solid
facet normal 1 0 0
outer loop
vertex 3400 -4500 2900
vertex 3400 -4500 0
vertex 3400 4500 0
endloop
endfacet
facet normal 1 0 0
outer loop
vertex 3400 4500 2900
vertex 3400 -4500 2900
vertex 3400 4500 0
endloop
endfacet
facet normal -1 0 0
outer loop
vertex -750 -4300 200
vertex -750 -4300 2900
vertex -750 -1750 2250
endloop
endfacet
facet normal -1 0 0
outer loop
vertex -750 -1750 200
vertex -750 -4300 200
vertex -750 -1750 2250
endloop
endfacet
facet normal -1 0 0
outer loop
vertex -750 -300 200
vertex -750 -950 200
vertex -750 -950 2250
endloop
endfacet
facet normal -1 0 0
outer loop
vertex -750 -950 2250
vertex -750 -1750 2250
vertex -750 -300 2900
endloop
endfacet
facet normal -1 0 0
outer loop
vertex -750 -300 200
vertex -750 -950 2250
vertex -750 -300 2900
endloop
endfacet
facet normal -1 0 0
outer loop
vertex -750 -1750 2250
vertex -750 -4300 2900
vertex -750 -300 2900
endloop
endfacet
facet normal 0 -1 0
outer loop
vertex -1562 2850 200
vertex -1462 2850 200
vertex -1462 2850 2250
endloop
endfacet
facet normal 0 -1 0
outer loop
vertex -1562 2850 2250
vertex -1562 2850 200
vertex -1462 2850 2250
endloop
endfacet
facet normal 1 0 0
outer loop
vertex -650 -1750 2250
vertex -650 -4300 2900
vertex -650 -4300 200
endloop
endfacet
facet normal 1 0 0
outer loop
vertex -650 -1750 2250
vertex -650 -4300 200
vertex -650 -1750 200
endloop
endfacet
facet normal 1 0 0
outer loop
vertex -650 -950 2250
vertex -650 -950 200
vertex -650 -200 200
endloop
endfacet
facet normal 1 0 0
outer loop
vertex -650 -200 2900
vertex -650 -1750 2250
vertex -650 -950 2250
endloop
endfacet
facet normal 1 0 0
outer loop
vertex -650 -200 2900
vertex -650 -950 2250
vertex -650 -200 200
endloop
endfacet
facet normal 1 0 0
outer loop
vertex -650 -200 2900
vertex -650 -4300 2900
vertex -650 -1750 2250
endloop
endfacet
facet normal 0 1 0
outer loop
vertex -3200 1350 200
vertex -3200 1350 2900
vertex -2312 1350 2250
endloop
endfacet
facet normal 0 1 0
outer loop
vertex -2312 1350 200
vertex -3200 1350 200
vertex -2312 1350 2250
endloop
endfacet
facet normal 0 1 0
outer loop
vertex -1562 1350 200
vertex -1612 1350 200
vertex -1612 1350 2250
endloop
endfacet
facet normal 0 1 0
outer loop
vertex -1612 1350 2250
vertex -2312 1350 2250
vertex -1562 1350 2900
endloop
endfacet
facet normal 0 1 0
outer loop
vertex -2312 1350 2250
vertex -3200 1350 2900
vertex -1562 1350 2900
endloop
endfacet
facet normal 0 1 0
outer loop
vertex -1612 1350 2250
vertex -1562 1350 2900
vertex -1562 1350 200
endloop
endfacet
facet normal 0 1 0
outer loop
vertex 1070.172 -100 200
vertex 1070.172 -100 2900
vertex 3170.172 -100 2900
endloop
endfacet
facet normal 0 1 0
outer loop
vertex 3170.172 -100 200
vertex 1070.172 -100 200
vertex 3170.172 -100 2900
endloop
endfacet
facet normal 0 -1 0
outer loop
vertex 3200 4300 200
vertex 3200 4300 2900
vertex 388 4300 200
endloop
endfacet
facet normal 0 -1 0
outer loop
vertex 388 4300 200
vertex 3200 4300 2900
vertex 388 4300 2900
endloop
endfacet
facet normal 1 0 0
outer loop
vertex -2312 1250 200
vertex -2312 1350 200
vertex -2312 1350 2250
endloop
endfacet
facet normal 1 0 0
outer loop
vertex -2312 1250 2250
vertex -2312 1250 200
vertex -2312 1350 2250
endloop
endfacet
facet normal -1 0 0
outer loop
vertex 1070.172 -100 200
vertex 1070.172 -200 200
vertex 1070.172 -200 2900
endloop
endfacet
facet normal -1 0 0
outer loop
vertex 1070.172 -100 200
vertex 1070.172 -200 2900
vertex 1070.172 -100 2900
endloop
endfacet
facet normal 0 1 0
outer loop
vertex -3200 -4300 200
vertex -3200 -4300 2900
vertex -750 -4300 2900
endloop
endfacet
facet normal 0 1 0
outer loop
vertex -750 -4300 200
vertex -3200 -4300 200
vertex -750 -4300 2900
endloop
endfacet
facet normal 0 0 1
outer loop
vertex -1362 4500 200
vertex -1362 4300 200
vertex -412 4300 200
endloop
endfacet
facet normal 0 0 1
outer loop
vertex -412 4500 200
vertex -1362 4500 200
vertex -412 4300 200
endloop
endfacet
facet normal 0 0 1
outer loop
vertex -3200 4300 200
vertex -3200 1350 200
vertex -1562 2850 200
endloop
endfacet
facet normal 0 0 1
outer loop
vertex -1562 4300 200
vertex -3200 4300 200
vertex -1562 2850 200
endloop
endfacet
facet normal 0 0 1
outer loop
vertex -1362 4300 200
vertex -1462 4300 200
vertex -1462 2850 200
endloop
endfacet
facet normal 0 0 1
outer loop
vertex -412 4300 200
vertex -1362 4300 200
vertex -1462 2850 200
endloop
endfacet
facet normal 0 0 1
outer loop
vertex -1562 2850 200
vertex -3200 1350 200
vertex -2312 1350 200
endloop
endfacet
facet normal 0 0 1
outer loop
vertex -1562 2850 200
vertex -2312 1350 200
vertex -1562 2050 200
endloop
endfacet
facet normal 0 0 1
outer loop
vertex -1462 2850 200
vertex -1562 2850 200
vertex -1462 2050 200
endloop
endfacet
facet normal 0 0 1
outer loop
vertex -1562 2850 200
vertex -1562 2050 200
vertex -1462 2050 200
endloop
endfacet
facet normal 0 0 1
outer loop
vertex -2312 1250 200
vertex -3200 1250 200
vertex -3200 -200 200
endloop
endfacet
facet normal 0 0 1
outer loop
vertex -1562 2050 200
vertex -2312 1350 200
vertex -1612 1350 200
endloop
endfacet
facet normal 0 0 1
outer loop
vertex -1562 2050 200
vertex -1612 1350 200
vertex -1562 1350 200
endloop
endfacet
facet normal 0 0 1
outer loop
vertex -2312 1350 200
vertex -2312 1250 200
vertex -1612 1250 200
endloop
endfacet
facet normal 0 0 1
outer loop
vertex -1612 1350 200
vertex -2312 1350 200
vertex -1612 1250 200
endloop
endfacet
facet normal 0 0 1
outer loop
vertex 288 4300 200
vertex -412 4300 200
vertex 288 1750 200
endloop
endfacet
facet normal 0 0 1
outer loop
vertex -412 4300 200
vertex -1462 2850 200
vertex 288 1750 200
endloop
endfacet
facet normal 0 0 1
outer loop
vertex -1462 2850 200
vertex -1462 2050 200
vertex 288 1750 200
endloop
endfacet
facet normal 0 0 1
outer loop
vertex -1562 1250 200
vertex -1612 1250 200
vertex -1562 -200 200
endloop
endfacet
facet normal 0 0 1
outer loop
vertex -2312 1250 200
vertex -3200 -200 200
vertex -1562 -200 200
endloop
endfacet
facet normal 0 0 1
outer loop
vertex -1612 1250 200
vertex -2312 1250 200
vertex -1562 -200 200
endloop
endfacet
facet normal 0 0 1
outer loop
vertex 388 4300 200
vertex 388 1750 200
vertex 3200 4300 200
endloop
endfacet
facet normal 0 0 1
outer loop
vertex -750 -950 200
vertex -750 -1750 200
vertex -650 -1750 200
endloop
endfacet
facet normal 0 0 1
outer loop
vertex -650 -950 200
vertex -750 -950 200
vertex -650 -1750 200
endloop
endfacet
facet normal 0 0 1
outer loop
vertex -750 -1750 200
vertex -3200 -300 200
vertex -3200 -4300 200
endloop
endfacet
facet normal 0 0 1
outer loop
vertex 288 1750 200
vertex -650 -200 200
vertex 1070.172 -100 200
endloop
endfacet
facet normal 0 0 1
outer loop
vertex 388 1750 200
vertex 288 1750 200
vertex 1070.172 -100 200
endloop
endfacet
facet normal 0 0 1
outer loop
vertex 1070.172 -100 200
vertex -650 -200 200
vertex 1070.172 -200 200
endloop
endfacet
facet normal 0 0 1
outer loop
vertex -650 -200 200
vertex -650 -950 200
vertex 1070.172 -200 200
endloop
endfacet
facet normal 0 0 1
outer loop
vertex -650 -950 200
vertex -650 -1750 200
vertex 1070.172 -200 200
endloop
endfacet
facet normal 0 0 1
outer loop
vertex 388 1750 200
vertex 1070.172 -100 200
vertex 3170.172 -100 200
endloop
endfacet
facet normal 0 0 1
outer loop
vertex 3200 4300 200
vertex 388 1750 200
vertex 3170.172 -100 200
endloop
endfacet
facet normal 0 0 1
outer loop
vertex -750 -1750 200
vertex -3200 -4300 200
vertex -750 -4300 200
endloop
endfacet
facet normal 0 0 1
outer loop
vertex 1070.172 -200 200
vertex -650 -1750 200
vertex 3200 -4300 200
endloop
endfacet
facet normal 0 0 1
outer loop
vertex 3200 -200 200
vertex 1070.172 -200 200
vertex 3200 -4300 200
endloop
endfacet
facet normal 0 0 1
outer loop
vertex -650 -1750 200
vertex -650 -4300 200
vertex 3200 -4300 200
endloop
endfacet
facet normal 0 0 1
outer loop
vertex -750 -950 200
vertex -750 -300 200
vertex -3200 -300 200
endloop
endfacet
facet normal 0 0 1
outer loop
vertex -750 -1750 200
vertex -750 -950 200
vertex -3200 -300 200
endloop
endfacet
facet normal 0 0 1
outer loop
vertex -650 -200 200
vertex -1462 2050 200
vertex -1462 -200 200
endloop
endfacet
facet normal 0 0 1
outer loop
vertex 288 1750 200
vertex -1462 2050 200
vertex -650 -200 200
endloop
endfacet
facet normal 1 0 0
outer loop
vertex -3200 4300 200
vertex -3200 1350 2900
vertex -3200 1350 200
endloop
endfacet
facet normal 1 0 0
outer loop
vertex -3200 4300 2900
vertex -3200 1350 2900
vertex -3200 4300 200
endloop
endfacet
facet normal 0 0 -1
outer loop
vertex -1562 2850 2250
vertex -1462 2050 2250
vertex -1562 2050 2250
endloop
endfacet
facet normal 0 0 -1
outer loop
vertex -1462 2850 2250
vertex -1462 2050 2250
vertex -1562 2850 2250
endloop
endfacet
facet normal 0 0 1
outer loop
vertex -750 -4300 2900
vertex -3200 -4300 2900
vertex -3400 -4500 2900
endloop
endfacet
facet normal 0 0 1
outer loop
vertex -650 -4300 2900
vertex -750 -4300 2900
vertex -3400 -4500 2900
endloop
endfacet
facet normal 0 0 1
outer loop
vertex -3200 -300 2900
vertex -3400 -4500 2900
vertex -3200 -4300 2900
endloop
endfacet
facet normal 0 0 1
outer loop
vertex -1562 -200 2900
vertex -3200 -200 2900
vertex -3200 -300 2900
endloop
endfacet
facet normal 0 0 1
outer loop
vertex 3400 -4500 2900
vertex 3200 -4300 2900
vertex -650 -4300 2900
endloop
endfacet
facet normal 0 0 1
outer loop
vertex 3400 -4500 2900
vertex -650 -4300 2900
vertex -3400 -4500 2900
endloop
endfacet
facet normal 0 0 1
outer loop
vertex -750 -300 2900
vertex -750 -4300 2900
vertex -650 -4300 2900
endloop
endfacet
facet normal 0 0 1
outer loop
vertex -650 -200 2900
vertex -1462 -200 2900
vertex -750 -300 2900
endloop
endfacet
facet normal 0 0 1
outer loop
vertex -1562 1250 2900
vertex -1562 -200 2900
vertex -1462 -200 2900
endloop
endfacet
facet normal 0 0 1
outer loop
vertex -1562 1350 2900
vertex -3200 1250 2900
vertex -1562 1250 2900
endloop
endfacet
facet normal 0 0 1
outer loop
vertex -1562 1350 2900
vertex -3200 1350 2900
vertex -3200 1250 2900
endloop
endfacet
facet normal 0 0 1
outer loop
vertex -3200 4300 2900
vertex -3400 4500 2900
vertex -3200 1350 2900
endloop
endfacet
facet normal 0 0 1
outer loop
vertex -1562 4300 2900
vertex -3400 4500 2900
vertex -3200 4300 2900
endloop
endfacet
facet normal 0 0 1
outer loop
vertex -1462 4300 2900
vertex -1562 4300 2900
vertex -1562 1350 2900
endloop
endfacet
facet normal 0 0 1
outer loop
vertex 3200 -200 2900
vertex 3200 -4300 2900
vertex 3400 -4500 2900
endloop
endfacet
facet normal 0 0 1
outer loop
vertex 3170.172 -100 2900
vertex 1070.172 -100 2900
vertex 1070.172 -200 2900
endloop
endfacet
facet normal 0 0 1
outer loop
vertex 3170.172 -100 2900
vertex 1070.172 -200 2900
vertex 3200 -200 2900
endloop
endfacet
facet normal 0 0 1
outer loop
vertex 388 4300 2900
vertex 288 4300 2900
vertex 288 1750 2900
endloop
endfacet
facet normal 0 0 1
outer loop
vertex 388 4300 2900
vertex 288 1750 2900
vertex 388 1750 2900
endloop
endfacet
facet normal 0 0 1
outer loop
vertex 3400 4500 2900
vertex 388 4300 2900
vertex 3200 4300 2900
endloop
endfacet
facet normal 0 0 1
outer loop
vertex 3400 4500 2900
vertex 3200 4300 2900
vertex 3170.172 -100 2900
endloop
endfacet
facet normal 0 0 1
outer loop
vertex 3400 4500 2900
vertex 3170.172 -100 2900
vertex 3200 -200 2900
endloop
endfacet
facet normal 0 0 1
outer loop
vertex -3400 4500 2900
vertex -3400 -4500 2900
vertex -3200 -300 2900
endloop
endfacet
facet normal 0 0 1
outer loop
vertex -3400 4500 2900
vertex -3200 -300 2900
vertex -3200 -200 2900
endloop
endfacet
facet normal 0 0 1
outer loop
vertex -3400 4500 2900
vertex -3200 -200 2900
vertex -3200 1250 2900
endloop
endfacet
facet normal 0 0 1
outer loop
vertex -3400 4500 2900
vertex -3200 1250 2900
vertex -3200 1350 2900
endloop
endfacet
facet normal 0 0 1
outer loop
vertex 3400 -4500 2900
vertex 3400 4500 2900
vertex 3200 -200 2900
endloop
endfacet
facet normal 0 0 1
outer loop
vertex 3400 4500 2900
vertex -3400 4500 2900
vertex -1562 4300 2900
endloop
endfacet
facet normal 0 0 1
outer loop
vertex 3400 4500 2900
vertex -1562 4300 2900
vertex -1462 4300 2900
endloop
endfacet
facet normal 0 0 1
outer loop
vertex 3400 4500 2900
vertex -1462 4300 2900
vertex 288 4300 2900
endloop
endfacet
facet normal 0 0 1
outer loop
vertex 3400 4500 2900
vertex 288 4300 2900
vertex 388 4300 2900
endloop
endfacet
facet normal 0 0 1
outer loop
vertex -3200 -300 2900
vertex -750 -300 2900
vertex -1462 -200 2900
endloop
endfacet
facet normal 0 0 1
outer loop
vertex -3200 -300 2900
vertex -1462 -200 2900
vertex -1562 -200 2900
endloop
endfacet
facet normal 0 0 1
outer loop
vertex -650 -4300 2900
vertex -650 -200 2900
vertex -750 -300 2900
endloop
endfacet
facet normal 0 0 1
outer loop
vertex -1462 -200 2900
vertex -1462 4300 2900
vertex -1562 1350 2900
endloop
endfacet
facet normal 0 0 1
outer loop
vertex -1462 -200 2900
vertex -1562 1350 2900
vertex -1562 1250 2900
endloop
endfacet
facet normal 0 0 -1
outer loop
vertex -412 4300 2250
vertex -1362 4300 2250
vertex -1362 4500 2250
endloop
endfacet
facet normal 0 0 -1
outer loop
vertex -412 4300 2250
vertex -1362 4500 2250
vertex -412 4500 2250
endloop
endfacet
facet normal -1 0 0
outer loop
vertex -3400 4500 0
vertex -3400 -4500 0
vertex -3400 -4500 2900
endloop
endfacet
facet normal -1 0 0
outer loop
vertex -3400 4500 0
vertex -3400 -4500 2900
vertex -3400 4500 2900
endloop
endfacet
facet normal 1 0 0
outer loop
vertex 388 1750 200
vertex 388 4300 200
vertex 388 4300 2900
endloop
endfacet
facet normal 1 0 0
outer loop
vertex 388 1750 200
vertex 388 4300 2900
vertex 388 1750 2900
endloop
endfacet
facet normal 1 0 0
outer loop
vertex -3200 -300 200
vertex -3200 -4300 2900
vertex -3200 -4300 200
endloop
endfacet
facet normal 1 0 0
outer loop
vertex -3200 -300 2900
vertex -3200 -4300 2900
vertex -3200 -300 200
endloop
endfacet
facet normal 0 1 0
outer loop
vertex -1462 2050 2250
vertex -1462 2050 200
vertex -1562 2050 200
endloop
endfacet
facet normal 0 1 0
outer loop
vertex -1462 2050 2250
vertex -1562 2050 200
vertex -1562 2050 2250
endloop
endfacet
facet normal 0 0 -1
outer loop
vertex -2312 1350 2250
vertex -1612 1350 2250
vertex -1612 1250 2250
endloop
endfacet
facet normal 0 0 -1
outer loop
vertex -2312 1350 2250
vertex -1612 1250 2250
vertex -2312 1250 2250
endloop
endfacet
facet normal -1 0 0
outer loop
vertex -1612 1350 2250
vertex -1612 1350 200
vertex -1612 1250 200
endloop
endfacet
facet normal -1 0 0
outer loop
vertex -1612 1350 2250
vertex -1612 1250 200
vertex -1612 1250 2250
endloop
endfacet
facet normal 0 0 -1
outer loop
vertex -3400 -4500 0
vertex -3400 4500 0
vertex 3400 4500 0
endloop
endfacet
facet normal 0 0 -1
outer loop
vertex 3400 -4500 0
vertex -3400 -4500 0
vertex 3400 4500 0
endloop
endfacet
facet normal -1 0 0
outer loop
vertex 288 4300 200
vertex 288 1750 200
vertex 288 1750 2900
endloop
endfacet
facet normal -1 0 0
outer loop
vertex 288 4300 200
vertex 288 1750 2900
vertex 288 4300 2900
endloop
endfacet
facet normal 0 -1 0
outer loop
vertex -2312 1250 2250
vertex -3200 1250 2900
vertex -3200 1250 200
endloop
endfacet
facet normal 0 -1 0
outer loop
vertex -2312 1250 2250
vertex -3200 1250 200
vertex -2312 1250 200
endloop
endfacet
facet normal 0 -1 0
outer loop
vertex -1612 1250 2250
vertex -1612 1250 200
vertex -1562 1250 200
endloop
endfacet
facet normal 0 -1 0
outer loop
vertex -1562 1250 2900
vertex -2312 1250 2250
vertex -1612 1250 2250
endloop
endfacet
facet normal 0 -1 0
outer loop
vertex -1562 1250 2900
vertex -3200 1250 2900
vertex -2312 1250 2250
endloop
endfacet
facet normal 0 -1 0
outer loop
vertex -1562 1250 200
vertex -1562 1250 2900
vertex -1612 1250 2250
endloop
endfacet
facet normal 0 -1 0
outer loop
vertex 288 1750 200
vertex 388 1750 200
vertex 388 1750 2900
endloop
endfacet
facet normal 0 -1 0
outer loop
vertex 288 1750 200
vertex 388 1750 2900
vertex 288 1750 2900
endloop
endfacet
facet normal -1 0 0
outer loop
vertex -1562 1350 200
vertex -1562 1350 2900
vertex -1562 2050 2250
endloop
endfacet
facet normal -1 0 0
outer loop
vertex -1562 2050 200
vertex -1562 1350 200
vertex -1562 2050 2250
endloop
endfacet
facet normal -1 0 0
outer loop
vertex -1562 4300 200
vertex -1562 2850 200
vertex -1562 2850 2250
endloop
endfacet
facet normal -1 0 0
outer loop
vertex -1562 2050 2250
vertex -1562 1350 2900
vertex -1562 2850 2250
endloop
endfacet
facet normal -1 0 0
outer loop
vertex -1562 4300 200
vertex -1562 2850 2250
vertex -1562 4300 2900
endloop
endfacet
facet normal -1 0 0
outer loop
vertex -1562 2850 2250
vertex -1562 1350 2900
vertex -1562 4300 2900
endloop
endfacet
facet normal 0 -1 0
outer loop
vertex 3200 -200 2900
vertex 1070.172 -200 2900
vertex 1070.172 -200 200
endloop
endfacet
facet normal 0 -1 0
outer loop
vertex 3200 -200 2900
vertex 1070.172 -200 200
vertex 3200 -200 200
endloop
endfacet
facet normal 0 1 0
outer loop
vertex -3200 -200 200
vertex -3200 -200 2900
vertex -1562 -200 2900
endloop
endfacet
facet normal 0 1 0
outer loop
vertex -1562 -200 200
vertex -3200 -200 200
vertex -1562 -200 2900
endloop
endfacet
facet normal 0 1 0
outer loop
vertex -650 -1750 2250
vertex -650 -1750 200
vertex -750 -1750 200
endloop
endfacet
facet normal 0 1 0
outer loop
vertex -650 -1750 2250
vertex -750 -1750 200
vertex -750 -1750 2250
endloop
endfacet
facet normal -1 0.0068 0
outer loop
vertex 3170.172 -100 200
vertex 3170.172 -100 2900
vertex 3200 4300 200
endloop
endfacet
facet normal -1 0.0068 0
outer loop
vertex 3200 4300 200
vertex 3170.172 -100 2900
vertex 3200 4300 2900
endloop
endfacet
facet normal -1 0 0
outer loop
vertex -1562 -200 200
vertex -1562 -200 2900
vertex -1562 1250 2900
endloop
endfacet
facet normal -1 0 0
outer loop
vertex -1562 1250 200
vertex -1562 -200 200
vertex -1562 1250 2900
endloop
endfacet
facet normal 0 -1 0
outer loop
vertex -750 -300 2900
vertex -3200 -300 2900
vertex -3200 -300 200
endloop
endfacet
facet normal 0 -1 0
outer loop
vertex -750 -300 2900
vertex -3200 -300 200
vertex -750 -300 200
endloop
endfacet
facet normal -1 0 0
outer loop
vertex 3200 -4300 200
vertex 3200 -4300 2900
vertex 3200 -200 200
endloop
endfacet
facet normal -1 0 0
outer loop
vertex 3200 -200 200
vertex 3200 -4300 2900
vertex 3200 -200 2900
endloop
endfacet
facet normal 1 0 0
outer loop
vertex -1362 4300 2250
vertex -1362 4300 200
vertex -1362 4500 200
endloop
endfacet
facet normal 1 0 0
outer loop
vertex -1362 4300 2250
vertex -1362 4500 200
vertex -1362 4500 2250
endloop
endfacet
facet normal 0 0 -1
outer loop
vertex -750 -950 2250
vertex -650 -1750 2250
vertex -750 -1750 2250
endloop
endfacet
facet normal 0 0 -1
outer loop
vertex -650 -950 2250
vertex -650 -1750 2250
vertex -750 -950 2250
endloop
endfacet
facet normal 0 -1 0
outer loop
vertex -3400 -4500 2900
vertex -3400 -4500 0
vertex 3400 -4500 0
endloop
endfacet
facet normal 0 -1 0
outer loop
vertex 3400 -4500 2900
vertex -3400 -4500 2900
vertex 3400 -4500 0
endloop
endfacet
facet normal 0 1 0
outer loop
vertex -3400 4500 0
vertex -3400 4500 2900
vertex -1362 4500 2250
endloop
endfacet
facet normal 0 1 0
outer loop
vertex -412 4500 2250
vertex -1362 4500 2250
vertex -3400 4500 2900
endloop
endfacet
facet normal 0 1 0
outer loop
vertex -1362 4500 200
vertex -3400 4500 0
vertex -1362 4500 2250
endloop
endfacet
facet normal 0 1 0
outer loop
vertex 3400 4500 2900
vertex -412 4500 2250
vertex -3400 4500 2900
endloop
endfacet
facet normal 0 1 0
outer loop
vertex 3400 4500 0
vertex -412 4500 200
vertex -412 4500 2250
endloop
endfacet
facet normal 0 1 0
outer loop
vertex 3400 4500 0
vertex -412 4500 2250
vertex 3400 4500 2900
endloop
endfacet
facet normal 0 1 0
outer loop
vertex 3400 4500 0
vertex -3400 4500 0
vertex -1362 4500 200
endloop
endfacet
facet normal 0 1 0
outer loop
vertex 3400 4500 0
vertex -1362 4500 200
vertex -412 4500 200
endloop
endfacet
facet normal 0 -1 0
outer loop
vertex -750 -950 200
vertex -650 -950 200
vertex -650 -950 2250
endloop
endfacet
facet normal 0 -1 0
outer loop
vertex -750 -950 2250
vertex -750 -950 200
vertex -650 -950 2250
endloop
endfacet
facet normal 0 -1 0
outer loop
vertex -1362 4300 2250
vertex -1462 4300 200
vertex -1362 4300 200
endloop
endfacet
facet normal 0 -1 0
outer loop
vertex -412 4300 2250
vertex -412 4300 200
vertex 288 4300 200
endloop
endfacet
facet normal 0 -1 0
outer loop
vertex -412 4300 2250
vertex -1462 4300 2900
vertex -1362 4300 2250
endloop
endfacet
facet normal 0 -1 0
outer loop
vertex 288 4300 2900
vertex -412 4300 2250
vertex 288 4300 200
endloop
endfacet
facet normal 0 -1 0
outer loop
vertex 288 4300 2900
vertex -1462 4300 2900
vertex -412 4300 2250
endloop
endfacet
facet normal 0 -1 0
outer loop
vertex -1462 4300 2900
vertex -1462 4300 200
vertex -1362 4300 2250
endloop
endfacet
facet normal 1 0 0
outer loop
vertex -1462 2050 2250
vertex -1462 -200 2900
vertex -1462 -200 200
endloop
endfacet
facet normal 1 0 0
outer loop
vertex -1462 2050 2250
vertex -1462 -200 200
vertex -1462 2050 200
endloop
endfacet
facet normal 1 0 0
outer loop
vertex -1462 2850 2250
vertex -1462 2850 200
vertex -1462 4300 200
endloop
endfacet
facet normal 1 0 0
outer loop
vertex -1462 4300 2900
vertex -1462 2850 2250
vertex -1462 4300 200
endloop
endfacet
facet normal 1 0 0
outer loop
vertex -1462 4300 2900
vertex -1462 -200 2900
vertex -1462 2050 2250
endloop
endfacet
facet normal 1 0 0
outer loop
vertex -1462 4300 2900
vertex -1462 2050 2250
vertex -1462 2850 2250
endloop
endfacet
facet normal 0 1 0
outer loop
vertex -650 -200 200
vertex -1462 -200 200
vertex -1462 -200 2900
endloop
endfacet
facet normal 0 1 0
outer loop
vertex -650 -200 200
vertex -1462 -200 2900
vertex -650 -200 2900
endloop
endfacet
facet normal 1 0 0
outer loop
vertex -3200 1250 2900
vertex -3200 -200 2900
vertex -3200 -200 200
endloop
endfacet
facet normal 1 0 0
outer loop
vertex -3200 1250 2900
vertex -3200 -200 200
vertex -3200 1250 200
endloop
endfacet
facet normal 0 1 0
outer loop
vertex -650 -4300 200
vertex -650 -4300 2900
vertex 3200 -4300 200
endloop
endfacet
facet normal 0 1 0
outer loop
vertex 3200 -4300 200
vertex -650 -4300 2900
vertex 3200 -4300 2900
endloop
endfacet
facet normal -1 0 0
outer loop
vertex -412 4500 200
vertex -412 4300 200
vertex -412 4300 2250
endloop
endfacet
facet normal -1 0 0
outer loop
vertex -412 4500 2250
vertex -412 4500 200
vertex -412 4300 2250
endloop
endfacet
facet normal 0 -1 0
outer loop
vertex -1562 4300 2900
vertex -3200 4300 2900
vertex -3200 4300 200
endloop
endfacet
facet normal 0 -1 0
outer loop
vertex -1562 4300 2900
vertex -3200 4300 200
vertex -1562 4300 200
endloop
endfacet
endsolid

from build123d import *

# Parameters (mm, degrees)
F0_W      = 6800
F0_H      = 9000
F1_DEPTH  = 2900
F2_W      = 3850
F2_H      = 4100
F3_DEPTH  = 2700
F4_W      = 2450
F4_H      = 4000
F5_DEPTH  = 2700
F6_W      = 1750
F6_H      = 4500
F7_DEPTH  = 2700
F9_DEPTH  = 2700
F10_W     = 1638
F10_H     = 2950
F10_H_2   = 1450
F11_DEPTH = 2700
F12_W     = 800
F12_H     = 2050
F13_DEPTH = 100
F14_W     = 800
F14_H     = 2050
F15_DEPTH = 100
F16_W     = 950
F16_H     = 2050
F17_DEPTH = 200
F18_W     = 700
F18_H     = 2050
F19_DEPTH = 100


with BuildPart() as f1:
    # F0 (on Top) → F1 (new body)
    with BuildSketch(Plane.XY):
        Rectangle(F0_W, F0_H)
    extrude(amount=F1_DEPTH)

    # F2 (on face) → F3 (cut)
    with BuildSketch(Plane.XY.offset(2900)):
        with Locations((1275, -2250)):
            Rectangle(F2_W, F2_H)
    extrude(amount=-F3_DEPTH, mode=Mode.SUBTRACT)

    # F4 (on face) → F5 (cut)
    with BuildSketch(Plane.XY.offset(2900)):
        with Locations((-1975, -2300)):
            Rectangle(F4_W, F4_H)
    extrude(amount=-F5_DEPTH, mode=Mode.SUBTRACT)

    # F6 (on face) → F7 (cut)
    with BuildSketch(Plane.XY.offset(2900)):
        with Locations((-587, 2050)):
            Rectangle(F6_W, F6_H)
    extrude(amount=-F7_DEPTH, mode=Mode.SUBTRACT)

    # F8 (on face) → F9 (cut)
    with BuildSketch(Plane.XY.offset(2900)):
        Polygon((3170.171952, -100), (3200, 4300), (388, 4300), (388, 1750), (288, 1750), (288, -200), (1070.171952, -200), (1070.171952, -100), align=None)
    extrude(amount=-F9_DEPTH, mode=Mode.SUBTRACT)

    # F10 (on face) → F11 (cut)
    with BuildSketch(Plane.XY.offset(2900)):
        with Locations((-2381, 2825)):
            Rectangle(F10_W, F10_H)
        with Locations((-2381, 525)):
            Rectangle(F10_W, F10_H_2)
    extrude(amount=-F11_DEPTH, mode=Mode.SUBTRACT)

    # F12 (on face) → F13 (cut)
    with BuildSketch(Plane.YZ.offset(-650)):
        with Locations((-1350, 1225)):
            Rectangle(F12_W, F12_H)
    extrude(amount=-F13_DEPTH, mode=Mode.SUBTRACT)

    # F14 (on face) → F15 (cut)
    with BuildSketch(Plane.YZ.offset(-1462)):
        with Locations((2450, 1225)):
            Rectangle(F14_W, F14_H)
    extrude(amount=-F15_DEPTH, mode=Mode.SUBTRACT)

    # F16 (on face) → F17 (cut)
    with BuildSketch(Plane.XZ.offset(-4300)):
        with Locations((-887, 1225)):
            Rectangle(F16_W, F16_H)
    extrude(amount=-F17_DEPTH, mode=Mode.SUBTRACT)

    # F18 (on face) → F19 (cut)
    with BuildSketch(Plane(origin=(0, 1350, 0), x_dir=(-1, 0, 0), z_dir=(0, 1, 0))):
        with Locations((1962, 1225)):
            Rectangle(F18_W, F18_H)
    extrude(amount=-F19_DEPTH, mode=Mode.SUBTRACT)


solid = f1.part
